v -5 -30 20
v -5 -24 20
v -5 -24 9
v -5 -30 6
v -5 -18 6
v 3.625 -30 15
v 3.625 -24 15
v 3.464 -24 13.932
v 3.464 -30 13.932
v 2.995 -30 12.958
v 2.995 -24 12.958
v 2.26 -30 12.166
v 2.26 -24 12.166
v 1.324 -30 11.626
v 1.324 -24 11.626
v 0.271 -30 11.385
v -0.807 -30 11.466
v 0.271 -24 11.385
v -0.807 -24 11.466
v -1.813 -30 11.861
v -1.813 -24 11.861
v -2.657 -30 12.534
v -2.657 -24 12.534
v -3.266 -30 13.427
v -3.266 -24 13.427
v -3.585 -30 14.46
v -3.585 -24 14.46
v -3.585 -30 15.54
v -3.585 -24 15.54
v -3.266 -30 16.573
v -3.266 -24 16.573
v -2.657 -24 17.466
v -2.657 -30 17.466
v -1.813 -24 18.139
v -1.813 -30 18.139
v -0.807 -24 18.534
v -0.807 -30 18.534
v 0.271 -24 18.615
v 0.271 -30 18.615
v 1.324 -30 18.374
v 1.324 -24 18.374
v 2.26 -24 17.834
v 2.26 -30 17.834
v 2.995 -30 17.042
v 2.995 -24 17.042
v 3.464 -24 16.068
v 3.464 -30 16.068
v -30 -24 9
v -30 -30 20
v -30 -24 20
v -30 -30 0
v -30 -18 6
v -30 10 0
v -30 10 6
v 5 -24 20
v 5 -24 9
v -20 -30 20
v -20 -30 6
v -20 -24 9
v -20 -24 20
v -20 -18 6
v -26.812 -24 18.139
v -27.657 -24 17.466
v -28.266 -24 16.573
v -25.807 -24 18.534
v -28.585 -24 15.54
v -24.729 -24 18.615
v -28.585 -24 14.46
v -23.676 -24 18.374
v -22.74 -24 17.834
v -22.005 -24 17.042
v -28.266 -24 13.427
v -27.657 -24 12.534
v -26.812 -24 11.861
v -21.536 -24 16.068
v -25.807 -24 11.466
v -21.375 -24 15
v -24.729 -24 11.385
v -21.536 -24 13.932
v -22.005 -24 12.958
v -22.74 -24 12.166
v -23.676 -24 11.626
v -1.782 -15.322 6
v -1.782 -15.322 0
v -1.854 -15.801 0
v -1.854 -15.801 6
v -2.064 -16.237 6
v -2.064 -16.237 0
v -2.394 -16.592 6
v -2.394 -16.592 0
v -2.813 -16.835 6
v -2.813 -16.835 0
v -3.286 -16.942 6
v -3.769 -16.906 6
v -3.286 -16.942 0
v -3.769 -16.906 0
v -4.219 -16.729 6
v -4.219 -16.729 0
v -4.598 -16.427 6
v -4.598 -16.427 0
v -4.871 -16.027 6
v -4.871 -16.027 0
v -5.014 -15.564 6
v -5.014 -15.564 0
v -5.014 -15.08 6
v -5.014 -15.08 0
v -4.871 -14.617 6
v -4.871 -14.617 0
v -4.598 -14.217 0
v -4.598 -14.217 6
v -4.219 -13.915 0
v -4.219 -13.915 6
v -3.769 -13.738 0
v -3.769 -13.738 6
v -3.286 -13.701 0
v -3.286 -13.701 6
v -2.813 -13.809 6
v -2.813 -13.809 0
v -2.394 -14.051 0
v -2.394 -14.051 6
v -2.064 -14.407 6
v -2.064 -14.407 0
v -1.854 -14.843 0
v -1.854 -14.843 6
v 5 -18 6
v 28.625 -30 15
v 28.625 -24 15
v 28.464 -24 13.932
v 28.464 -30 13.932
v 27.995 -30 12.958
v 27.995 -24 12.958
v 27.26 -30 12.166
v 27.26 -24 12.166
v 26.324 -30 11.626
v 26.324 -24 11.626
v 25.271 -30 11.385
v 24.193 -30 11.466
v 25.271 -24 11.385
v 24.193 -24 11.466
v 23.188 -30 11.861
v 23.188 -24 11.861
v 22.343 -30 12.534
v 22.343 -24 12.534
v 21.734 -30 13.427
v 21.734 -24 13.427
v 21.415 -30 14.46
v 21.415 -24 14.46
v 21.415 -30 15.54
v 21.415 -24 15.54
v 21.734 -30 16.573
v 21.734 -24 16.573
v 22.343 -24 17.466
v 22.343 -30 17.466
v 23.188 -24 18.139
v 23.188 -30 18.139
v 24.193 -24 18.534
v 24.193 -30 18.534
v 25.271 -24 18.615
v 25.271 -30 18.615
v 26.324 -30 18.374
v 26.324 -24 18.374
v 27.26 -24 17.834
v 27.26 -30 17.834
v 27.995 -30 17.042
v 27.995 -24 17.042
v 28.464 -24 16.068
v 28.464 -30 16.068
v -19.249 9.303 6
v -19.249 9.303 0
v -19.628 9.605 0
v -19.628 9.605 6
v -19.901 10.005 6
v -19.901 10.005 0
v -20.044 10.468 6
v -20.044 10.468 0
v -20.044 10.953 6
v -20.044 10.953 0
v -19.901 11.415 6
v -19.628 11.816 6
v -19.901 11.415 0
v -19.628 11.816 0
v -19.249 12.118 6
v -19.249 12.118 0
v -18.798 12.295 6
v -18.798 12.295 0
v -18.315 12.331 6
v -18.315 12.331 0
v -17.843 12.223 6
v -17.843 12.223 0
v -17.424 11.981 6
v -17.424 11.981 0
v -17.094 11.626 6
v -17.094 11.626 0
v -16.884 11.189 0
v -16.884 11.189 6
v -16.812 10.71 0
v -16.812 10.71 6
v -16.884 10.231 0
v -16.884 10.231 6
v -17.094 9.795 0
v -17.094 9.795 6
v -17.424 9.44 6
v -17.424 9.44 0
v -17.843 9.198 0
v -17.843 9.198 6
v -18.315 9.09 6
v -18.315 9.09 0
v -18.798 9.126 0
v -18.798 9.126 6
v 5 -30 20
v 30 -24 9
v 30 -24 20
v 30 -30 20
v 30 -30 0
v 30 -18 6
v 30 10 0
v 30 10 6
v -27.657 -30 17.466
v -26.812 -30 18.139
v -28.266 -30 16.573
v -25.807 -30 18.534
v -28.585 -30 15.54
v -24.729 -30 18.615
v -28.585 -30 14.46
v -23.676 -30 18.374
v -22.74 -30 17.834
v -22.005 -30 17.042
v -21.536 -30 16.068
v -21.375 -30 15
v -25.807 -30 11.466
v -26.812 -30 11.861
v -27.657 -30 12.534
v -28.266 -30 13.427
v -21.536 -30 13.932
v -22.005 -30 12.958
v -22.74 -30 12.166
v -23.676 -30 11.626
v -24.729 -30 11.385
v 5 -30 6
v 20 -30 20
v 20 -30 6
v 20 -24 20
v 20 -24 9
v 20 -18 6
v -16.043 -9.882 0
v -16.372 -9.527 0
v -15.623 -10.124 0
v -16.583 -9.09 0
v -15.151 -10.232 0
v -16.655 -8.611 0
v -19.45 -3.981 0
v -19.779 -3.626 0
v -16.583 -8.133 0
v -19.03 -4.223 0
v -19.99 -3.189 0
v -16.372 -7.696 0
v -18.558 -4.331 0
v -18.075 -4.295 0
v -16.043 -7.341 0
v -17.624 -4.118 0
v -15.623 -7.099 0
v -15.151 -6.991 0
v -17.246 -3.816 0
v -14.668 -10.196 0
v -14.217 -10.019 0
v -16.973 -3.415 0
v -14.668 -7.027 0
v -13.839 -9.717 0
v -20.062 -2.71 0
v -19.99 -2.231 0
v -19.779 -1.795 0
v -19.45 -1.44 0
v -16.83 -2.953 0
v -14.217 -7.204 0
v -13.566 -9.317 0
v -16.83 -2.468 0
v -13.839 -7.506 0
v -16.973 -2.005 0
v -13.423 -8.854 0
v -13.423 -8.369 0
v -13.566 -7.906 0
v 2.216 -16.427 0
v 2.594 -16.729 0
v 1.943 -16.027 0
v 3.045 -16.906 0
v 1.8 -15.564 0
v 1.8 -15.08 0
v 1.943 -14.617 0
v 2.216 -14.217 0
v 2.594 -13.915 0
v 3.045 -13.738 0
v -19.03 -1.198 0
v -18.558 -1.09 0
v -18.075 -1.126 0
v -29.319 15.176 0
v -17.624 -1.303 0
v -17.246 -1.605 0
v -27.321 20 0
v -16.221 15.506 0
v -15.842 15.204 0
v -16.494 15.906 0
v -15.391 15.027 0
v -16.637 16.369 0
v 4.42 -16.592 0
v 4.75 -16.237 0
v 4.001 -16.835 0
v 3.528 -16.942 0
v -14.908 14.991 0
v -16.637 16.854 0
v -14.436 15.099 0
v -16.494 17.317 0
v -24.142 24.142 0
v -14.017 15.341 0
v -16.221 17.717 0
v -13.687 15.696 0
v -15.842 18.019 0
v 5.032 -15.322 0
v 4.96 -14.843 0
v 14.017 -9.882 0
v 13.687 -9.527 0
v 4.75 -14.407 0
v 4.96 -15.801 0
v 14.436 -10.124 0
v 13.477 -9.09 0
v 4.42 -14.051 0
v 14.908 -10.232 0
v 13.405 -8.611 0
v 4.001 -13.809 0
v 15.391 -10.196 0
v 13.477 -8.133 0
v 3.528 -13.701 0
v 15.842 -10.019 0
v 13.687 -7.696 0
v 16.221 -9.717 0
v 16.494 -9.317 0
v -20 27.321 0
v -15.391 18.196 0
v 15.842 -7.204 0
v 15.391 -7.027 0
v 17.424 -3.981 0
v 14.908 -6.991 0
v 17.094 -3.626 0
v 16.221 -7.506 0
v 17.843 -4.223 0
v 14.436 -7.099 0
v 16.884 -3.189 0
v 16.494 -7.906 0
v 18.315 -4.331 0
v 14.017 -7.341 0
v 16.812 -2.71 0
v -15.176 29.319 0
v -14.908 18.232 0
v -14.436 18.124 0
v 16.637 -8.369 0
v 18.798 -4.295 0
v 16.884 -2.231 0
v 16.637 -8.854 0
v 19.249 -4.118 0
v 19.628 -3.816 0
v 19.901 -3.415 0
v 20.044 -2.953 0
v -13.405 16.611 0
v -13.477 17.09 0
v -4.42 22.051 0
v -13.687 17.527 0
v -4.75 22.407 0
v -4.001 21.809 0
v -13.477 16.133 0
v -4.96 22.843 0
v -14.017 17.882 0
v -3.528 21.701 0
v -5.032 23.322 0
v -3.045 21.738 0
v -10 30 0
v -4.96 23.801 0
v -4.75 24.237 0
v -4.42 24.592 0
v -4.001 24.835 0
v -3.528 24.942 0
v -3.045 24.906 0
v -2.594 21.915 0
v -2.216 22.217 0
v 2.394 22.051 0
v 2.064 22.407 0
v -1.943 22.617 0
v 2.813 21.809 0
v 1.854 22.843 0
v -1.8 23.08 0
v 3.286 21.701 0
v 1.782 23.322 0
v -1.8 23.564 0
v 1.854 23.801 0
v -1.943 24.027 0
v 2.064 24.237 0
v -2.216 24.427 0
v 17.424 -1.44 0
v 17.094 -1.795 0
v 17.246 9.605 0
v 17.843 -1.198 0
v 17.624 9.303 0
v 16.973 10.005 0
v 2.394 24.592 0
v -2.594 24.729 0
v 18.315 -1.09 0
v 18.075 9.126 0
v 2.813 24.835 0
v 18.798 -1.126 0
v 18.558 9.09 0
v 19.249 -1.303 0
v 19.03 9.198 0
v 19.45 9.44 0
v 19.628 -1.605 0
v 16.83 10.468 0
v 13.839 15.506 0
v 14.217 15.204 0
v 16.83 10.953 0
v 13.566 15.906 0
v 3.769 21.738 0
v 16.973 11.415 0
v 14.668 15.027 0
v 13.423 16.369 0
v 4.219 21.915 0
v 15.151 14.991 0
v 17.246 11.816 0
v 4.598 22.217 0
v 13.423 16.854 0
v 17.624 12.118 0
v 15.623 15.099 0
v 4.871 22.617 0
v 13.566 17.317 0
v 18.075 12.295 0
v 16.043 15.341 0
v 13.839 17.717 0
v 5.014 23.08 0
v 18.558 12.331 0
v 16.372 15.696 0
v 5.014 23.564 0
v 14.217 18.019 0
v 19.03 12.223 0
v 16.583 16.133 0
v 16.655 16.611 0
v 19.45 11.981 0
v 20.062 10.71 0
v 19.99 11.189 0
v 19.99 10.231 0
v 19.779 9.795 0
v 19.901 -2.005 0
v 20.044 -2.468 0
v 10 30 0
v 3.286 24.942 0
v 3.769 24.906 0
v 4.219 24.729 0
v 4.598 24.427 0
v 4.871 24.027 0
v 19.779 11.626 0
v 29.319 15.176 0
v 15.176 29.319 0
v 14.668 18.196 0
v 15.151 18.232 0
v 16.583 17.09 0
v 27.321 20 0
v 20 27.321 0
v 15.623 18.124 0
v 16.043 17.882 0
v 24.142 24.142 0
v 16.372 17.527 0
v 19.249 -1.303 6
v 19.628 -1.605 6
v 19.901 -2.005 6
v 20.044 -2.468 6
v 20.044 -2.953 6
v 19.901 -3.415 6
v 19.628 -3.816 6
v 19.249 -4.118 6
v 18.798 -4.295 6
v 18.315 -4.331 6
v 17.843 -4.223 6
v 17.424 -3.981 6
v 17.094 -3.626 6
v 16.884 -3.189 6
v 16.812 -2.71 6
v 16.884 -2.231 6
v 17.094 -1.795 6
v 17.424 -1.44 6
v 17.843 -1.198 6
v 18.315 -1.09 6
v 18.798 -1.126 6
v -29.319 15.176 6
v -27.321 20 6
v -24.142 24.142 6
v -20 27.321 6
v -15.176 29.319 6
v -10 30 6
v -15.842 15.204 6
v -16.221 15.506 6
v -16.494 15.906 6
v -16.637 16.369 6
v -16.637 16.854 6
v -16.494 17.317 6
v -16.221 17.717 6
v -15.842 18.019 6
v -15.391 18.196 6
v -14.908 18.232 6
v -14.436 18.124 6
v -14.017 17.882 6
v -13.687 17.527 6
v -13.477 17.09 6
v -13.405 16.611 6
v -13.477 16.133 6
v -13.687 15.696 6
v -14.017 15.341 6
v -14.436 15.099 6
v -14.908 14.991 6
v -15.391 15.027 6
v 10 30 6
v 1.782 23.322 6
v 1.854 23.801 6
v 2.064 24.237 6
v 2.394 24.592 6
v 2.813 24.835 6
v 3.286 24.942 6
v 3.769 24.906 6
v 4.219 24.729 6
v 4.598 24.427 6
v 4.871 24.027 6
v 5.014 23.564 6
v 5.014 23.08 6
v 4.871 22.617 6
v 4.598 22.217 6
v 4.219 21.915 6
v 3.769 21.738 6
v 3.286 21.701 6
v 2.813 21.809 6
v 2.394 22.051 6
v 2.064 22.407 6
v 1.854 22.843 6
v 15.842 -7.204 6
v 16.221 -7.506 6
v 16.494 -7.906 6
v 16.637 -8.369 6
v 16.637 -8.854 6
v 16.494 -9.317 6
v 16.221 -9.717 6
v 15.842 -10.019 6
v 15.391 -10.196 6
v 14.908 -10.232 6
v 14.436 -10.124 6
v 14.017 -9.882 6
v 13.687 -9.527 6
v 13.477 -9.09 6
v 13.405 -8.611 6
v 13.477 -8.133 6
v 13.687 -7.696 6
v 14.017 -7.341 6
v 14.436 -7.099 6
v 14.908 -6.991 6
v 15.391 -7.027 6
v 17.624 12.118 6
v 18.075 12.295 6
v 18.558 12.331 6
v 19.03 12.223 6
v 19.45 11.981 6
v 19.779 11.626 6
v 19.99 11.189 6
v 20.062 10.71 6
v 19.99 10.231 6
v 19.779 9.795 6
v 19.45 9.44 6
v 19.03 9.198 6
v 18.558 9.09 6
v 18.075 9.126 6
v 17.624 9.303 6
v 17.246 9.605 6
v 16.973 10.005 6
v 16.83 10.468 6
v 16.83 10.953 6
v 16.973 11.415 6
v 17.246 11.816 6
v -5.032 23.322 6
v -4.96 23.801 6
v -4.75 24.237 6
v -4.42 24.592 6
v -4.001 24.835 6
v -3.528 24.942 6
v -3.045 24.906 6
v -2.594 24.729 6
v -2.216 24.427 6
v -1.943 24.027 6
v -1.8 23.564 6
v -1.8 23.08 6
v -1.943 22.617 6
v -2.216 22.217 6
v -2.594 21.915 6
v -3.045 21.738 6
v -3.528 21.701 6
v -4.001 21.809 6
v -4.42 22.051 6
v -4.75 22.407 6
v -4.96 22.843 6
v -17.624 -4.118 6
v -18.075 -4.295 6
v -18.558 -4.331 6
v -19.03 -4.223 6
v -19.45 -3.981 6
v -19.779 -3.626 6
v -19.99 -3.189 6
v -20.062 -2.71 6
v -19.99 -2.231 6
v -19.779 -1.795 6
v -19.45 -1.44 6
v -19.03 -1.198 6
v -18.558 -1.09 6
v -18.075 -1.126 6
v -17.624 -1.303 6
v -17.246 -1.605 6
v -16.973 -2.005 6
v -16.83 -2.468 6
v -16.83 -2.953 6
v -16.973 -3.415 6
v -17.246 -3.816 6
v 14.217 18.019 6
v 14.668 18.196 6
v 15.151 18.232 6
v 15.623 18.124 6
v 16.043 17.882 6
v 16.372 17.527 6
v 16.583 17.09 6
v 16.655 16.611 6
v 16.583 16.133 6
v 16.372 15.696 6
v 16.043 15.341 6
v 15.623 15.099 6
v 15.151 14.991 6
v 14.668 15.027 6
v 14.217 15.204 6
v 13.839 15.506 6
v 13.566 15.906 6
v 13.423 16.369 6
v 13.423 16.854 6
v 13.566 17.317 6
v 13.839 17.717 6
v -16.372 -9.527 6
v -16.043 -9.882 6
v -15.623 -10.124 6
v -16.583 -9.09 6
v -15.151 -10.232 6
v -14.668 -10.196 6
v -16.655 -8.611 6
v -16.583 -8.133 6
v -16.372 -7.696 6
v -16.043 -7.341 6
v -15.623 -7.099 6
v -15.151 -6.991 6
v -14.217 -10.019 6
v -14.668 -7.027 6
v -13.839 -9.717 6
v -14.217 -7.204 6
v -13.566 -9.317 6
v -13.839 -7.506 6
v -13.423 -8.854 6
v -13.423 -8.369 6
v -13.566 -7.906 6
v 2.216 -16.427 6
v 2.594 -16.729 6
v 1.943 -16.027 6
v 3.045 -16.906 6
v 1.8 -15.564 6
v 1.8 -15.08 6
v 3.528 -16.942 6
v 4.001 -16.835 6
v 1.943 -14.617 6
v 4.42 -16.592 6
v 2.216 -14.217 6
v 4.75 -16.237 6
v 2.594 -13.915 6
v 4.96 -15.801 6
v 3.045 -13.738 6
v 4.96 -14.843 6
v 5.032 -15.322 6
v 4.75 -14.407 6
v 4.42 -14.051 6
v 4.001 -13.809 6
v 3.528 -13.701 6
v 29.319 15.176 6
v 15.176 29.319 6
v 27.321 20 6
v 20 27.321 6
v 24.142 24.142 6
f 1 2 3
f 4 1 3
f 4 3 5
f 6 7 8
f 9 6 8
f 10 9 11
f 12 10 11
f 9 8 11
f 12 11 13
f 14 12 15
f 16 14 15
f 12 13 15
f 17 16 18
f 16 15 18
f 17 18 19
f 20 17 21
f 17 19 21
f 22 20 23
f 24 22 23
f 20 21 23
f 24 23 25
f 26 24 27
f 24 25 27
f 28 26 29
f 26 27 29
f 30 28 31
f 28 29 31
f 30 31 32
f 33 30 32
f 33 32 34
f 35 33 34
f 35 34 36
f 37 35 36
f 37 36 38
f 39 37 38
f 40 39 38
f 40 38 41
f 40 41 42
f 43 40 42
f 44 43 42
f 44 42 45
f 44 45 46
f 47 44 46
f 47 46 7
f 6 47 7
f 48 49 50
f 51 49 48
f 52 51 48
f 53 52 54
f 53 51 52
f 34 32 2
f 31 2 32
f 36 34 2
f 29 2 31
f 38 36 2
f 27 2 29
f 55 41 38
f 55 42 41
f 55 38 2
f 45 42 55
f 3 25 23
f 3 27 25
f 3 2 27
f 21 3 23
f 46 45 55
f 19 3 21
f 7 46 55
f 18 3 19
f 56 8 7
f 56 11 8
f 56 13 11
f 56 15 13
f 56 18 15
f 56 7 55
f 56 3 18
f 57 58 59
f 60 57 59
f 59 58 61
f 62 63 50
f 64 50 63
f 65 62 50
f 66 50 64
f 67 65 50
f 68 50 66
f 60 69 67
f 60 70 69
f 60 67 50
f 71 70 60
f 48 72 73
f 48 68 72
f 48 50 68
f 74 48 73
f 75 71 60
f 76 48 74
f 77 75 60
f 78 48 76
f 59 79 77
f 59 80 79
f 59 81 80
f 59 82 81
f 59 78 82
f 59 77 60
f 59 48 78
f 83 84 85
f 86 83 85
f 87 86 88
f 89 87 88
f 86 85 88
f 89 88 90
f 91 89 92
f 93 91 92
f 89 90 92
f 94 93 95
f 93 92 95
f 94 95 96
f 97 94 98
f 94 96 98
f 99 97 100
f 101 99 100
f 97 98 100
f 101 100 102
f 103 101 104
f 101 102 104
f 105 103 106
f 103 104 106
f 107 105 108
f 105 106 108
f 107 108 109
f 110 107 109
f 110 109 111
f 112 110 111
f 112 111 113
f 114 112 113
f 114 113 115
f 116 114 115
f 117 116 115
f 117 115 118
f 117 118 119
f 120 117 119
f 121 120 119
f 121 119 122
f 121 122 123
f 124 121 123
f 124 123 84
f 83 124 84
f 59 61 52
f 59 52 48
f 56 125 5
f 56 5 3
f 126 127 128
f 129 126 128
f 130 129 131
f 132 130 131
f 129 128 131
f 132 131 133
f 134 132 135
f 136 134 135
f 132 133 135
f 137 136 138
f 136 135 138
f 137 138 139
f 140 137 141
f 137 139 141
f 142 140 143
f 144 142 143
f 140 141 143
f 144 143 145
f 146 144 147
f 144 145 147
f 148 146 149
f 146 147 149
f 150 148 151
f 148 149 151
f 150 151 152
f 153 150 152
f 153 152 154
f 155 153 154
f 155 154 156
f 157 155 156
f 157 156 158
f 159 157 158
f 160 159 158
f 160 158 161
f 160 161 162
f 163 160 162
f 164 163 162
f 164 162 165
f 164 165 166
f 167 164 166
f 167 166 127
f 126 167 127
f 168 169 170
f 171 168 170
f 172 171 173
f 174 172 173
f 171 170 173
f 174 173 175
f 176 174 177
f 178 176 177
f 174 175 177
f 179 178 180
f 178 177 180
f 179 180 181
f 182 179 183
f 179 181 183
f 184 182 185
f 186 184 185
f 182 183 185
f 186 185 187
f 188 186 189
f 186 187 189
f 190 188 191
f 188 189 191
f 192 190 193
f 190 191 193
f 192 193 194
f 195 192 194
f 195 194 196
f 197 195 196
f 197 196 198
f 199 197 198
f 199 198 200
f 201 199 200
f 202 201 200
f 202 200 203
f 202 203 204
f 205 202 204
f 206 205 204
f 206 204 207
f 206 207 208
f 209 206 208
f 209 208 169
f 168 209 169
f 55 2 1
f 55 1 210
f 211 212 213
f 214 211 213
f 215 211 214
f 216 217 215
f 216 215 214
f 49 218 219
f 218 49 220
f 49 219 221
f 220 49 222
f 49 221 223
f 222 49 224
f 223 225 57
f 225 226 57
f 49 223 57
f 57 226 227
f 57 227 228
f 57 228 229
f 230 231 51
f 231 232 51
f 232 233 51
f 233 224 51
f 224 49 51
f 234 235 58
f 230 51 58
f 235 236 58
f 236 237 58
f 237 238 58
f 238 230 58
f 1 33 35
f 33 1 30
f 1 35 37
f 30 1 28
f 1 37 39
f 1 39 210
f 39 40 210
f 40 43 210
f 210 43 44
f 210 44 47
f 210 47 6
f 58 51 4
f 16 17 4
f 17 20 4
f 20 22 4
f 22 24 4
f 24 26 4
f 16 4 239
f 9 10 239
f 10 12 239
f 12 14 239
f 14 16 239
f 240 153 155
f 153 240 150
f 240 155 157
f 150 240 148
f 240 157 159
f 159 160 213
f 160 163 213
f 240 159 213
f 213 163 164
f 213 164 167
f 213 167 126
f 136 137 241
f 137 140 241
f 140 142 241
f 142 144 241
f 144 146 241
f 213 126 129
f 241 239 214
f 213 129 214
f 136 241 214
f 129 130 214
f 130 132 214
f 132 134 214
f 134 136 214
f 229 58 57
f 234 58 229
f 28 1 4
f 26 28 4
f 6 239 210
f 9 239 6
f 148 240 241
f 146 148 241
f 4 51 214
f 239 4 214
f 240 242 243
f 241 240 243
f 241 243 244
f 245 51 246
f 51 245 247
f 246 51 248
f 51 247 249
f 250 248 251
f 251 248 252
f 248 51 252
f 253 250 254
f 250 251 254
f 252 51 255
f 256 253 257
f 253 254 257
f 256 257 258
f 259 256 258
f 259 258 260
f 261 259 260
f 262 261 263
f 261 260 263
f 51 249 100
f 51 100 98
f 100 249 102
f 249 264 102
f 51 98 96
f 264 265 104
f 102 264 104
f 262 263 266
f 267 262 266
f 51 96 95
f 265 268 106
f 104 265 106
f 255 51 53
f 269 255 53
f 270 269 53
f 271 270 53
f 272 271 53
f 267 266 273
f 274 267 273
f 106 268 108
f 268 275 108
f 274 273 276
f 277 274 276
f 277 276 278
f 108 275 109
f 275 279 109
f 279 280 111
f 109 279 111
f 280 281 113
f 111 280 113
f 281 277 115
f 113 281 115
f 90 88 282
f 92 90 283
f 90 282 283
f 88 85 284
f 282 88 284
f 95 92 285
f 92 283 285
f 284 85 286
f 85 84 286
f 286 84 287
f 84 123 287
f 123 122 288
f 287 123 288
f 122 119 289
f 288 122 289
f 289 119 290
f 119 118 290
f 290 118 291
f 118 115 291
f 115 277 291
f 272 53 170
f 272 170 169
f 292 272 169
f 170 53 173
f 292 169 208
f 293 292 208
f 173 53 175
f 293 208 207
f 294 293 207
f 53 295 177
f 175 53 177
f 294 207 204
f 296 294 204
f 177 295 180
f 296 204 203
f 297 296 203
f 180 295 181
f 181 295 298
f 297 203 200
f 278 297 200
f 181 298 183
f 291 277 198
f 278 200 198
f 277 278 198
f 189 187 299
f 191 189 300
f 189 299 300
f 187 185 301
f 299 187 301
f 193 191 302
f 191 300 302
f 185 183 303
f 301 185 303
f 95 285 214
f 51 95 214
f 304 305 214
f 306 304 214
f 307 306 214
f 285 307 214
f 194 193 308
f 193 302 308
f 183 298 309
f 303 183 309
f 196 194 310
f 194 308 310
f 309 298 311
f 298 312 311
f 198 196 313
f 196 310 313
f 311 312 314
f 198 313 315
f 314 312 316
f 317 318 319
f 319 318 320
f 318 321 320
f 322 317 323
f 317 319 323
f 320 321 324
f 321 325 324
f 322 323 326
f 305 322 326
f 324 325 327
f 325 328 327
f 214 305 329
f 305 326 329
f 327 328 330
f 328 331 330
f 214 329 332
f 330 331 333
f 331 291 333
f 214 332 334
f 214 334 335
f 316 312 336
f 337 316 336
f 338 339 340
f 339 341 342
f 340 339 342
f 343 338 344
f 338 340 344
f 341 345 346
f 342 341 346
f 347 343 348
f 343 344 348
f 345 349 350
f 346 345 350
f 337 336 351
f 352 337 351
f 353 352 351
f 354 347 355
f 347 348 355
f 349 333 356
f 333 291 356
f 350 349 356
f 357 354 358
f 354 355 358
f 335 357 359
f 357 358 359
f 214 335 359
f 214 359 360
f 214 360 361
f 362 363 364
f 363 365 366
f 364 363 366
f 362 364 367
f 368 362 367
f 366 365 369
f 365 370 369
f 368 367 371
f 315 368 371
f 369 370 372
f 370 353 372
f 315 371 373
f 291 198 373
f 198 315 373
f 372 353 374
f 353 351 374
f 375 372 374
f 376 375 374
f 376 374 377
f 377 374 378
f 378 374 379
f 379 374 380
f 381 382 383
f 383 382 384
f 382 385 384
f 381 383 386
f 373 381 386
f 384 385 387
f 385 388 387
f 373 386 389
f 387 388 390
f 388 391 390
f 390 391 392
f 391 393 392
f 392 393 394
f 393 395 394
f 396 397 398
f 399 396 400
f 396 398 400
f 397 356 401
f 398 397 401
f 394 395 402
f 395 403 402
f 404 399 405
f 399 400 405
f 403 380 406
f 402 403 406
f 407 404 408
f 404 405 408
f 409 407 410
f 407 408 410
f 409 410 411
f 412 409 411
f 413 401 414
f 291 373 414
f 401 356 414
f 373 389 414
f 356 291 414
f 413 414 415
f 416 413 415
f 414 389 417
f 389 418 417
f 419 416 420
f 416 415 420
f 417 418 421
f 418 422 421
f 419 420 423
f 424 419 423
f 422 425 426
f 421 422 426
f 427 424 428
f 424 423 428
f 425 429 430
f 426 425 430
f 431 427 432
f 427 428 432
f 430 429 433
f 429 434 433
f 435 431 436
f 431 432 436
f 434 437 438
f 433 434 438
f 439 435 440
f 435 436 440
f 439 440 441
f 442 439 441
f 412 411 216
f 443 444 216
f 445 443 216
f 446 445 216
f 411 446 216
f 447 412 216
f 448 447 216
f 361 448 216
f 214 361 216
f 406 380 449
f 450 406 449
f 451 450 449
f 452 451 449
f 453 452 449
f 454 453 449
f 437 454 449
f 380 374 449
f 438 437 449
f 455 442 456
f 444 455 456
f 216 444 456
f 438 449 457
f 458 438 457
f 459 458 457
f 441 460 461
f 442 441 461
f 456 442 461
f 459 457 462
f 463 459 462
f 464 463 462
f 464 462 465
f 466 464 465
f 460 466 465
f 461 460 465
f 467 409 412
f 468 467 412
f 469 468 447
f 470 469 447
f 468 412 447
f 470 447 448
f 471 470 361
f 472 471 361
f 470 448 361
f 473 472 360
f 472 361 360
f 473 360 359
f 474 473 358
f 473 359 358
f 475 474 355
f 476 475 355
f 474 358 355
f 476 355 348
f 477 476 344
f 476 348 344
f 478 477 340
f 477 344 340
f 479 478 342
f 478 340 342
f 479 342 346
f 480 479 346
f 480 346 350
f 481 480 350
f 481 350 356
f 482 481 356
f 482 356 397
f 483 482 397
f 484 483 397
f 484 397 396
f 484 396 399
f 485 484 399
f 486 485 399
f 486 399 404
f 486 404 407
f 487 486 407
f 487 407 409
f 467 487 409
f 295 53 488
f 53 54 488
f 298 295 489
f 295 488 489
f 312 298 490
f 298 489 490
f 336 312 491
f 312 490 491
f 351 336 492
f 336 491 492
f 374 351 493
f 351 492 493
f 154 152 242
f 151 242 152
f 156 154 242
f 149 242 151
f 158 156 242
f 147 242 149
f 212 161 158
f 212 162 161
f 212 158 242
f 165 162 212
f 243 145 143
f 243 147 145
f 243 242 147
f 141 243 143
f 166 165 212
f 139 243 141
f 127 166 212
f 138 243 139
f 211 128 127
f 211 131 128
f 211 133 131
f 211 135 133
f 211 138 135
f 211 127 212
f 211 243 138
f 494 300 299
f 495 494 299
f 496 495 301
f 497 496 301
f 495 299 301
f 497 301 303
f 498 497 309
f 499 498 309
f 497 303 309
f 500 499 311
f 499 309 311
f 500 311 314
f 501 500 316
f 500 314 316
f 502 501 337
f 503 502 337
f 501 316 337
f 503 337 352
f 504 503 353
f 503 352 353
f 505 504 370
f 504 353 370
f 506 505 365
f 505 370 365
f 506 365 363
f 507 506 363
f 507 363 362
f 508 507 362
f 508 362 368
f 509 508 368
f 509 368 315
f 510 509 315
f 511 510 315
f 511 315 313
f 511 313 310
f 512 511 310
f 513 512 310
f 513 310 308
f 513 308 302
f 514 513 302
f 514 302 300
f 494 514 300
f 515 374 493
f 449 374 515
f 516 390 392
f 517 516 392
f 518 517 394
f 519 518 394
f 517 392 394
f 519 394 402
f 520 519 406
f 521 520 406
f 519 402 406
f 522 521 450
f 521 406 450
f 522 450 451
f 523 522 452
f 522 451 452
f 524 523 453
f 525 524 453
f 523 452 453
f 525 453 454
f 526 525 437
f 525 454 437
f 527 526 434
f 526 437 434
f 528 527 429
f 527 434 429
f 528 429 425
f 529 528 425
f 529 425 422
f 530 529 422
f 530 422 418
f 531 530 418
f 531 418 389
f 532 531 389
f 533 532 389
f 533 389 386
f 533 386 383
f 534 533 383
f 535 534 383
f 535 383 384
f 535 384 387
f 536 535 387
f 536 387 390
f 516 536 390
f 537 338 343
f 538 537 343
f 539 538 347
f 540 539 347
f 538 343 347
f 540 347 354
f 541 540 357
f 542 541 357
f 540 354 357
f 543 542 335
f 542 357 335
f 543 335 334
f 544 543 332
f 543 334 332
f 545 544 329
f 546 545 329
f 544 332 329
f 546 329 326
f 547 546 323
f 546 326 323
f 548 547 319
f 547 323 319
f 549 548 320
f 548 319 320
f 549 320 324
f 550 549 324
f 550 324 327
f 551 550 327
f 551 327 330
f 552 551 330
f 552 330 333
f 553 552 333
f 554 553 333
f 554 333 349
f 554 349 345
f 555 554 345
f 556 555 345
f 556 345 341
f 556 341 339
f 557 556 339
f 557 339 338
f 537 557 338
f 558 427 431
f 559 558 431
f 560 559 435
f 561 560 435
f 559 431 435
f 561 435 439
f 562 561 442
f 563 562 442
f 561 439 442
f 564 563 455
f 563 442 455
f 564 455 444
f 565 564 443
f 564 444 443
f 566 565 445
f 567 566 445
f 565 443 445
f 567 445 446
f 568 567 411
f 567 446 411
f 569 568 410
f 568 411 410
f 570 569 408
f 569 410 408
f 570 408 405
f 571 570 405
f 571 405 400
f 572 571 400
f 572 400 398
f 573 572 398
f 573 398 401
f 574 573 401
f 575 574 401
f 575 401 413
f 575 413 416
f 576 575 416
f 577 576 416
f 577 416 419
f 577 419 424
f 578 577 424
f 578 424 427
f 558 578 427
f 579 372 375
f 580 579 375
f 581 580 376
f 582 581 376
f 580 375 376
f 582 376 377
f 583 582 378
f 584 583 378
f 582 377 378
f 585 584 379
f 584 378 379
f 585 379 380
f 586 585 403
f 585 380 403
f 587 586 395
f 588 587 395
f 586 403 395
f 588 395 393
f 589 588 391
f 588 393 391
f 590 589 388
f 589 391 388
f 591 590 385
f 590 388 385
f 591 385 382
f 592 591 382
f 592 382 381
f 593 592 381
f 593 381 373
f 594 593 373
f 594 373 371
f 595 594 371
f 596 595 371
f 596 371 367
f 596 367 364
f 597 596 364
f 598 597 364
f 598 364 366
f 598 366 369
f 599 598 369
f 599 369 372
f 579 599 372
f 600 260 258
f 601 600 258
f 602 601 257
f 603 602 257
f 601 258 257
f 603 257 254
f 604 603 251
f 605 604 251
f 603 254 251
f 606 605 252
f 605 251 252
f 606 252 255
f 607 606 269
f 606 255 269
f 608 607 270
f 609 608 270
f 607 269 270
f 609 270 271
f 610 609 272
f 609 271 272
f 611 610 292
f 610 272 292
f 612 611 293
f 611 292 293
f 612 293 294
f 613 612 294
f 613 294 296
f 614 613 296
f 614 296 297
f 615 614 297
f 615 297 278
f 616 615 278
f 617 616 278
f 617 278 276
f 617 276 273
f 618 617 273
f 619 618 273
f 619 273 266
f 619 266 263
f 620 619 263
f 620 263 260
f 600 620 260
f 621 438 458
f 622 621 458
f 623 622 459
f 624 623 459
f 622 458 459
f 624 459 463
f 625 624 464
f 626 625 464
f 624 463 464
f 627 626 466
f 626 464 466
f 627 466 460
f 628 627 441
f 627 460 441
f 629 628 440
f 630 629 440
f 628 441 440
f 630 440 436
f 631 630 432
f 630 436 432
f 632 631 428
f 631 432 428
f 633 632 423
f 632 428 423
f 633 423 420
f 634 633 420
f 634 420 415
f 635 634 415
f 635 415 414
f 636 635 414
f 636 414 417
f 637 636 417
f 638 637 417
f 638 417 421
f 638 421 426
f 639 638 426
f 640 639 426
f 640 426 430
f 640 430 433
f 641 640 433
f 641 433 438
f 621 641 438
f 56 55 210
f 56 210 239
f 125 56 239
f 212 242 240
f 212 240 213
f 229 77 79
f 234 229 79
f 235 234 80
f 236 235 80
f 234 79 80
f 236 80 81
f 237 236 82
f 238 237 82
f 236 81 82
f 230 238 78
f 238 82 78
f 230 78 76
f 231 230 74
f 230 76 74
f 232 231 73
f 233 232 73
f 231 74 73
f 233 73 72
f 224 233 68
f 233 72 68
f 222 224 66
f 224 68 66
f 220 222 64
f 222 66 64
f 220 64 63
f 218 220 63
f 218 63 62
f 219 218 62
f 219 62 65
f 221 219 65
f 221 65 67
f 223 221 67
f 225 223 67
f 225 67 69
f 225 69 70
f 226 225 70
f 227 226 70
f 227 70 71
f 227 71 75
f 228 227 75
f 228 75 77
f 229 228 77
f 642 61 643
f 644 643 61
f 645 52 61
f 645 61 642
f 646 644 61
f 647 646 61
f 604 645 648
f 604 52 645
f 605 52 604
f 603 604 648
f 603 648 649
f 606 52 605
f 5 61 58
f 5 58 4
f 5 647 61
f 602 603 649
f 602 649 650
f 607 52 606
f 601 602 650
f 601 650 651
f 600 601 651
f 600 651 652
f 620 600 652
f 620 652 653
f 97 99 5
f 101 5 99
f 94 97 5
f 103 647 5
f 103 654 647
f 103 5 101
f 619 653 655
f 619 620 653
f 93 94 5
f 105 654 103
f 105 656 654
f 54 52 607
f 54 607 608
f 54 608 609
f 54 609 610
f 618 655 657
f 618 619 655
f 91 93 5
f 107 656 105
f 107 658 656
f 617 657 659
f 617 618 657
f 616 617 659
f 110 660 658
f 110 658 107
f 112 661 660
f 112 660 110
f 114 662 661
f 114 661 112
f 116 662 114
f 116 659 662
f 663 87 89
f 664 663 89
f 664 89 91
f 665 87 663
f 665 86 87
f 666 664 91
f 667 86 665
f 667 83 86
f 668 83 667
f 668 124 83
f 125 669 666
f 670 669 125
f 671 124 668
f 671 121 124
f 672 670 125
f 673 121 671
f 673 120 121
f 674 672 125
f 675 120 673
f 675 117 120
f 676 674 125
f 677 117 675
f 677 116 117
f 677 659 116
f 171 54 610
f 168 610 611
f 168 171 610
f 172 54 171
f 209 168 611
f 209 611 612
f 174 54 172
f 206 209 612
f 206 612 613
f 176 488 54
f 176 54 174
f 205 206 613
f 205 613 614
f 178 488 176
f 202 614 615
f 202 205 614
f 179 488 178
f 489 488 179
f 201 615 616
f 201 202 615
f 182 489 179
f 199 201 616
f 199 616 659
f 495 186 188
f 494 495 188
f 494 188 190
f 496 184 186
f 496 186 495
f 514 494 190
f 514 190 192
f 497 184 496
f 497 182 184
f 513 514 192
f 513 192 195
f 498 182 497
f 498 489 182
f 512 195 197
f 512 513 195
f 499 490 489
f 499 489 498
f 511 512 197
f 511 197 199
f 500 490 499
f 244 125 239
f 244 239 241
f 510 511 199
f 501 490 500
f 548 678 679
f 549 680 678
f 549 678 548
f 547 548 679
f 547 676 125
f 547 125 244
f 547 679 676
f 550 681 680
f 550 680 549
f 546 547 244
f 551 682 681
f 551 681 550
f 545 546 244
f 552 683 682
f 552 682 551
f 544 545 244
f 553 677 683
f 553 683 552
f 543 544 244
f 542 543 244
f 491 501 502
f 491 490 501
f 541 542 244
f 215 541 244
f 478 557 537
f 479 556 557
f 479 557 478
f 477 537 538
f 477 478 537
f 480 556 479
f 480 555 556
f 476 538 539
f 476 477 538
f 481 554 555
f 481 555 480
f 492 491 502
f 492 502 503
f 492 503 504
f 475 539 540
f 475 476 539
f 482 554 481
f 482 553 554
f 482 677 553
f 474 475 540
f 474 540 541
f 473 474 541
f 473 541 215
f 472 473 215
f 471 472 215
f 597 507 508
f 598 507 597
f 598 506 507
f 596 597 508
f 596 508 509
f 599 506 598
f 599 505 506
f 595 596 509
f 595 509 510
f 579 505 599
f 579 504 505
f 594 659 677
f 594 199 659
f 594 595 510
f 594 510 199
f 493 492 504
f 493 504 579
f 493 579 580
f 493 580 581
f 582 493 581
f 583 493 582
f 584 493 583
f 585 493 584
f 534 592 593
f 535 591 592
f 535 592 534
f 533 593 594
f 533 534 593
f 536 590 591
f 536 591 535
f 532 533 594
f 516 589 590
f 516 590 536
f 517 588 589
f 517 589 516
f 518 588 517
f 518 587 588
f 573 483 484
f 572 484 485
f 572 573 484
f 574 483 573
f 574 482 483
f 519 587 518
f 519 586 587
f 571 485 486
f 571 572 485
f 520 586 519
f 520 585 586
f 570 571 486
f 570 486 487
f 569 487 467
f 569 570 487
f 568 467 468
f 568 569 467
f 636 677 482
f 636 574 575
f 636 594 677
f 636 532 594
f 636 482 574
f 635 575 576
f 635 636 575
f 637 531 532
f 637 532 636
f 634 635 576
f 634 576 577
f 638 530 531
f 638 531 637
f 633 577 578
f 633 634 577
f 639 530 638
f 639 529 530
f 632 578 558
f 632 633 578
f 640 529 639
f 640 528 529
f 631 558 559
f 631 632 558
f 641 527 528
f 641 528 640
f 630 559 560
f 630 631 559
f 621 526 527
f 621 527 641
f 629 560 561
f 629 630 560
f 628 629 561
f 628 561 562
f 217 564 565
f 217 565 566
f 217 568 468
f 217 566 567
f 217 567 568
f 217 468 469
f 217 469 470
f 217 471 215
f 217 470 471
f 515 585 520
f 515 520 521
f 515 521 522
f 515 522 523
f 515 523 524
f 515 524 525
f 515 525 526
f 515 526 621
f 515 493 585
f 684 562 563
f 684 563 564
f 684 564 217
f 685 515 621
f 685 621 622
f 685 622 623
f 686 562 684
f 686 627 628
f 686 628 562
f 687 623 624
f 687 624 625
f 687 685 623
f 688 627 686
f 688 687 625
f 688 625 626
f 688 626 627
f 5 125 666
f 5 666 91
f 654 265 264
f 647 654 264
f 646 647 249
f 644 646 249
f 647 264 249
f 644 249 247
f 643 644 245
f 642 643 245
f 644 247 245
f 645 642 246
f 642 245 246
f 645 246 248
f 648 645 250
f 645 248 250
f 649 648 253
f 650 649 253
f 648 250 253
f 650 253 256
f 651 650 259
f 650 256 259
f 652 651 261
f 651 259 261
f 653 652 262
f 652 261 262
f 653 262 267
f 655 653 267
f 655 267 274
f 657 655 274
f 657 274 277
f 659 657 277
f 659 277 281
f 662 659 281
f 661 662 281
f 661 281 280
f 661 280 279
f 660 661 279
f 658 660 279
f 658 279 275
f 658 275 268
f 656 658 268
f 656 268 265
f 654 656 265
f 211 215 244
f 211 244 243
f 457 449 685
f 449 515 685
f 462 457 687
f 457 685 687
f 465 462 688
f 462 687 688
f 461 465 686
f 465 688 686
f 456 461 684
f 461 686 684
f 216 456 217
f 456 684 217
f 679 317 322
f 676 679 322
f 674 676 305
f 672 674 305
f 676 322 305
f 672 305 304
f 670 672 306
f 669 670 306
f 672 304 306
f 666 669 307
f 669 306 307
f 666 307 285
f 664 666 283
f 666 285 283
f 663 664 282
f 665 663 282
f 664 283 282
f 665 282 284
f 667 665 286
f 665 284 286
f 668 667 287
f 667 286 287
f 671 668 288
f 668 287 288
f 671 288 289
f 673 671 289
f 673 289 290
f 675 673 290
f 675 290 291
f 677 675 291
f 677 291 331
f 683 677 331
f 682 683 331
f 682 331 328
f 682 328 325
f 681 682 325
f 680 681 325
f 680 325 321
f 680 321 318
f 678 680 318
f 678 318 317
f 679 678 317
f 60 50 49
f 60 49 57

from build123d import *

# Parameters (mm, degrees)
SKETCH1_W           = 60
SKETCH1_H           = 60
BOSS_EXTRUDE1_DEPTH = 6
SKETCH2_W           = 10
SKETCH2_H           = 6
BOSS_EXTRUDE2_DEPTH = 14
BOSS_EXTRUDE3_DEPTH = 10
SKETCH4_R           = 3.625
CUT_EXTRUDE1_DEPTH  = 15
LPATTERN2_COUNT     = 3
LPATTERN2_PITCH     = 25
SKETCH5_R           = 1.625
CUT_EXTRUDE2_DEPTH  = 15
CIRPATTERN2_COUNT   = 6
FILLET1_R           = 20


with BuildPart() as part:
    # Sketch1 → Boss-Extrude1 (new body)
    with BuildSketch(Plane.XY):
        Rectangle(SKETCH1_W, SKETCH1_H)
    extrude(amount=BOSS_EXTRUDE1_DEPTH)

    # Sketch2 → Boss-Extrude2 (add)
    with BuildSketch(Plane.XY.offset(6)):
        with Locations((25, -27)):
            Rectangle(SKETCH2_W, SKETCH2_H)
    boss_extrude2 = extrude(amount=BOSS_EXTRUDE2_DEPTH)

    # Sketch3 → Boss-Extrude3 (add)
    with BuildSketch(Plane(origin=(30, 0, 0), x_dir=(0, 0, -1), z_dir=(1, 0, 0))):
        Polygon((-6, -18), (-9, -24), (-6, -24), align=None)
    boss_extrude3 = extrude(amount=-BOSS_EXTRUDE3_DEPTH)

    # Sketch4 → Cut-Extrude1 (cut)
    with BuildSketch(Plane(origin=(0, -24, 0), x_dir=(1, 0, 0), z_dir=(0, 1, 0))):
        with Locations((25, -15)):
            Circle(SKETCH4_R)
    cut_extrude1 = extrude(amount=-CUT_EXTRUDE1_DEPTH, mode=Mode.SUBTRACT)

    # LPattern2: Boss-Extrude2, Boss-Extrude3, Cut-Extrude1 ×3
    with Locations(*[(-i * LPATTERN2_PITCH, 0, 0) for i in range(1, LPATTERN2_COUNT)]):
        add(boss_extrude2)
        add(boss_extrude3)
        add(cut_extrude1, mode=Mode.SUBTRACT)

    # Sketch5 → Cut-Extrude2 (cut)
    with BuildSketch(Plane(origin=(0, 0, 0), x_dir=(-1, 0, 0), z_dir=(0, 0, -1))):
        with Locations((3.406977246, 23.321928114)):
            Circle(SKETCH5_R)
        with Locations((-3.406977246, 23.321928114)):
            Circle(SKETCH5_R)
    cut_extrude2 = extrude(amount=-CUT_EXTRUDE2_DEPTH, mode=Mode.SUBTRACT)

    # CirPattern2: Cut-Extrude2 ×6 about axis
    cirpattern2_axis = Axis((0, 4, 0), (0, 0, 1))
    for i in range(1, CIRPATTERN2_COUNT):
        add(cut_extrude2.rotate(cirpattern2_axis, i * 360 / CIRPATTERN2_COUNT), mode=Mode.SUBTRACT)

    # Fillet1
    fillet1_edges = [part.edges().sort_by_distance(p)[0] for p in [
        (-30, 30, 3),
        (30, 30, 3),
    ]]
    fillet(fillet1_edges, radius=FILLET1_R)


solid = part.part
